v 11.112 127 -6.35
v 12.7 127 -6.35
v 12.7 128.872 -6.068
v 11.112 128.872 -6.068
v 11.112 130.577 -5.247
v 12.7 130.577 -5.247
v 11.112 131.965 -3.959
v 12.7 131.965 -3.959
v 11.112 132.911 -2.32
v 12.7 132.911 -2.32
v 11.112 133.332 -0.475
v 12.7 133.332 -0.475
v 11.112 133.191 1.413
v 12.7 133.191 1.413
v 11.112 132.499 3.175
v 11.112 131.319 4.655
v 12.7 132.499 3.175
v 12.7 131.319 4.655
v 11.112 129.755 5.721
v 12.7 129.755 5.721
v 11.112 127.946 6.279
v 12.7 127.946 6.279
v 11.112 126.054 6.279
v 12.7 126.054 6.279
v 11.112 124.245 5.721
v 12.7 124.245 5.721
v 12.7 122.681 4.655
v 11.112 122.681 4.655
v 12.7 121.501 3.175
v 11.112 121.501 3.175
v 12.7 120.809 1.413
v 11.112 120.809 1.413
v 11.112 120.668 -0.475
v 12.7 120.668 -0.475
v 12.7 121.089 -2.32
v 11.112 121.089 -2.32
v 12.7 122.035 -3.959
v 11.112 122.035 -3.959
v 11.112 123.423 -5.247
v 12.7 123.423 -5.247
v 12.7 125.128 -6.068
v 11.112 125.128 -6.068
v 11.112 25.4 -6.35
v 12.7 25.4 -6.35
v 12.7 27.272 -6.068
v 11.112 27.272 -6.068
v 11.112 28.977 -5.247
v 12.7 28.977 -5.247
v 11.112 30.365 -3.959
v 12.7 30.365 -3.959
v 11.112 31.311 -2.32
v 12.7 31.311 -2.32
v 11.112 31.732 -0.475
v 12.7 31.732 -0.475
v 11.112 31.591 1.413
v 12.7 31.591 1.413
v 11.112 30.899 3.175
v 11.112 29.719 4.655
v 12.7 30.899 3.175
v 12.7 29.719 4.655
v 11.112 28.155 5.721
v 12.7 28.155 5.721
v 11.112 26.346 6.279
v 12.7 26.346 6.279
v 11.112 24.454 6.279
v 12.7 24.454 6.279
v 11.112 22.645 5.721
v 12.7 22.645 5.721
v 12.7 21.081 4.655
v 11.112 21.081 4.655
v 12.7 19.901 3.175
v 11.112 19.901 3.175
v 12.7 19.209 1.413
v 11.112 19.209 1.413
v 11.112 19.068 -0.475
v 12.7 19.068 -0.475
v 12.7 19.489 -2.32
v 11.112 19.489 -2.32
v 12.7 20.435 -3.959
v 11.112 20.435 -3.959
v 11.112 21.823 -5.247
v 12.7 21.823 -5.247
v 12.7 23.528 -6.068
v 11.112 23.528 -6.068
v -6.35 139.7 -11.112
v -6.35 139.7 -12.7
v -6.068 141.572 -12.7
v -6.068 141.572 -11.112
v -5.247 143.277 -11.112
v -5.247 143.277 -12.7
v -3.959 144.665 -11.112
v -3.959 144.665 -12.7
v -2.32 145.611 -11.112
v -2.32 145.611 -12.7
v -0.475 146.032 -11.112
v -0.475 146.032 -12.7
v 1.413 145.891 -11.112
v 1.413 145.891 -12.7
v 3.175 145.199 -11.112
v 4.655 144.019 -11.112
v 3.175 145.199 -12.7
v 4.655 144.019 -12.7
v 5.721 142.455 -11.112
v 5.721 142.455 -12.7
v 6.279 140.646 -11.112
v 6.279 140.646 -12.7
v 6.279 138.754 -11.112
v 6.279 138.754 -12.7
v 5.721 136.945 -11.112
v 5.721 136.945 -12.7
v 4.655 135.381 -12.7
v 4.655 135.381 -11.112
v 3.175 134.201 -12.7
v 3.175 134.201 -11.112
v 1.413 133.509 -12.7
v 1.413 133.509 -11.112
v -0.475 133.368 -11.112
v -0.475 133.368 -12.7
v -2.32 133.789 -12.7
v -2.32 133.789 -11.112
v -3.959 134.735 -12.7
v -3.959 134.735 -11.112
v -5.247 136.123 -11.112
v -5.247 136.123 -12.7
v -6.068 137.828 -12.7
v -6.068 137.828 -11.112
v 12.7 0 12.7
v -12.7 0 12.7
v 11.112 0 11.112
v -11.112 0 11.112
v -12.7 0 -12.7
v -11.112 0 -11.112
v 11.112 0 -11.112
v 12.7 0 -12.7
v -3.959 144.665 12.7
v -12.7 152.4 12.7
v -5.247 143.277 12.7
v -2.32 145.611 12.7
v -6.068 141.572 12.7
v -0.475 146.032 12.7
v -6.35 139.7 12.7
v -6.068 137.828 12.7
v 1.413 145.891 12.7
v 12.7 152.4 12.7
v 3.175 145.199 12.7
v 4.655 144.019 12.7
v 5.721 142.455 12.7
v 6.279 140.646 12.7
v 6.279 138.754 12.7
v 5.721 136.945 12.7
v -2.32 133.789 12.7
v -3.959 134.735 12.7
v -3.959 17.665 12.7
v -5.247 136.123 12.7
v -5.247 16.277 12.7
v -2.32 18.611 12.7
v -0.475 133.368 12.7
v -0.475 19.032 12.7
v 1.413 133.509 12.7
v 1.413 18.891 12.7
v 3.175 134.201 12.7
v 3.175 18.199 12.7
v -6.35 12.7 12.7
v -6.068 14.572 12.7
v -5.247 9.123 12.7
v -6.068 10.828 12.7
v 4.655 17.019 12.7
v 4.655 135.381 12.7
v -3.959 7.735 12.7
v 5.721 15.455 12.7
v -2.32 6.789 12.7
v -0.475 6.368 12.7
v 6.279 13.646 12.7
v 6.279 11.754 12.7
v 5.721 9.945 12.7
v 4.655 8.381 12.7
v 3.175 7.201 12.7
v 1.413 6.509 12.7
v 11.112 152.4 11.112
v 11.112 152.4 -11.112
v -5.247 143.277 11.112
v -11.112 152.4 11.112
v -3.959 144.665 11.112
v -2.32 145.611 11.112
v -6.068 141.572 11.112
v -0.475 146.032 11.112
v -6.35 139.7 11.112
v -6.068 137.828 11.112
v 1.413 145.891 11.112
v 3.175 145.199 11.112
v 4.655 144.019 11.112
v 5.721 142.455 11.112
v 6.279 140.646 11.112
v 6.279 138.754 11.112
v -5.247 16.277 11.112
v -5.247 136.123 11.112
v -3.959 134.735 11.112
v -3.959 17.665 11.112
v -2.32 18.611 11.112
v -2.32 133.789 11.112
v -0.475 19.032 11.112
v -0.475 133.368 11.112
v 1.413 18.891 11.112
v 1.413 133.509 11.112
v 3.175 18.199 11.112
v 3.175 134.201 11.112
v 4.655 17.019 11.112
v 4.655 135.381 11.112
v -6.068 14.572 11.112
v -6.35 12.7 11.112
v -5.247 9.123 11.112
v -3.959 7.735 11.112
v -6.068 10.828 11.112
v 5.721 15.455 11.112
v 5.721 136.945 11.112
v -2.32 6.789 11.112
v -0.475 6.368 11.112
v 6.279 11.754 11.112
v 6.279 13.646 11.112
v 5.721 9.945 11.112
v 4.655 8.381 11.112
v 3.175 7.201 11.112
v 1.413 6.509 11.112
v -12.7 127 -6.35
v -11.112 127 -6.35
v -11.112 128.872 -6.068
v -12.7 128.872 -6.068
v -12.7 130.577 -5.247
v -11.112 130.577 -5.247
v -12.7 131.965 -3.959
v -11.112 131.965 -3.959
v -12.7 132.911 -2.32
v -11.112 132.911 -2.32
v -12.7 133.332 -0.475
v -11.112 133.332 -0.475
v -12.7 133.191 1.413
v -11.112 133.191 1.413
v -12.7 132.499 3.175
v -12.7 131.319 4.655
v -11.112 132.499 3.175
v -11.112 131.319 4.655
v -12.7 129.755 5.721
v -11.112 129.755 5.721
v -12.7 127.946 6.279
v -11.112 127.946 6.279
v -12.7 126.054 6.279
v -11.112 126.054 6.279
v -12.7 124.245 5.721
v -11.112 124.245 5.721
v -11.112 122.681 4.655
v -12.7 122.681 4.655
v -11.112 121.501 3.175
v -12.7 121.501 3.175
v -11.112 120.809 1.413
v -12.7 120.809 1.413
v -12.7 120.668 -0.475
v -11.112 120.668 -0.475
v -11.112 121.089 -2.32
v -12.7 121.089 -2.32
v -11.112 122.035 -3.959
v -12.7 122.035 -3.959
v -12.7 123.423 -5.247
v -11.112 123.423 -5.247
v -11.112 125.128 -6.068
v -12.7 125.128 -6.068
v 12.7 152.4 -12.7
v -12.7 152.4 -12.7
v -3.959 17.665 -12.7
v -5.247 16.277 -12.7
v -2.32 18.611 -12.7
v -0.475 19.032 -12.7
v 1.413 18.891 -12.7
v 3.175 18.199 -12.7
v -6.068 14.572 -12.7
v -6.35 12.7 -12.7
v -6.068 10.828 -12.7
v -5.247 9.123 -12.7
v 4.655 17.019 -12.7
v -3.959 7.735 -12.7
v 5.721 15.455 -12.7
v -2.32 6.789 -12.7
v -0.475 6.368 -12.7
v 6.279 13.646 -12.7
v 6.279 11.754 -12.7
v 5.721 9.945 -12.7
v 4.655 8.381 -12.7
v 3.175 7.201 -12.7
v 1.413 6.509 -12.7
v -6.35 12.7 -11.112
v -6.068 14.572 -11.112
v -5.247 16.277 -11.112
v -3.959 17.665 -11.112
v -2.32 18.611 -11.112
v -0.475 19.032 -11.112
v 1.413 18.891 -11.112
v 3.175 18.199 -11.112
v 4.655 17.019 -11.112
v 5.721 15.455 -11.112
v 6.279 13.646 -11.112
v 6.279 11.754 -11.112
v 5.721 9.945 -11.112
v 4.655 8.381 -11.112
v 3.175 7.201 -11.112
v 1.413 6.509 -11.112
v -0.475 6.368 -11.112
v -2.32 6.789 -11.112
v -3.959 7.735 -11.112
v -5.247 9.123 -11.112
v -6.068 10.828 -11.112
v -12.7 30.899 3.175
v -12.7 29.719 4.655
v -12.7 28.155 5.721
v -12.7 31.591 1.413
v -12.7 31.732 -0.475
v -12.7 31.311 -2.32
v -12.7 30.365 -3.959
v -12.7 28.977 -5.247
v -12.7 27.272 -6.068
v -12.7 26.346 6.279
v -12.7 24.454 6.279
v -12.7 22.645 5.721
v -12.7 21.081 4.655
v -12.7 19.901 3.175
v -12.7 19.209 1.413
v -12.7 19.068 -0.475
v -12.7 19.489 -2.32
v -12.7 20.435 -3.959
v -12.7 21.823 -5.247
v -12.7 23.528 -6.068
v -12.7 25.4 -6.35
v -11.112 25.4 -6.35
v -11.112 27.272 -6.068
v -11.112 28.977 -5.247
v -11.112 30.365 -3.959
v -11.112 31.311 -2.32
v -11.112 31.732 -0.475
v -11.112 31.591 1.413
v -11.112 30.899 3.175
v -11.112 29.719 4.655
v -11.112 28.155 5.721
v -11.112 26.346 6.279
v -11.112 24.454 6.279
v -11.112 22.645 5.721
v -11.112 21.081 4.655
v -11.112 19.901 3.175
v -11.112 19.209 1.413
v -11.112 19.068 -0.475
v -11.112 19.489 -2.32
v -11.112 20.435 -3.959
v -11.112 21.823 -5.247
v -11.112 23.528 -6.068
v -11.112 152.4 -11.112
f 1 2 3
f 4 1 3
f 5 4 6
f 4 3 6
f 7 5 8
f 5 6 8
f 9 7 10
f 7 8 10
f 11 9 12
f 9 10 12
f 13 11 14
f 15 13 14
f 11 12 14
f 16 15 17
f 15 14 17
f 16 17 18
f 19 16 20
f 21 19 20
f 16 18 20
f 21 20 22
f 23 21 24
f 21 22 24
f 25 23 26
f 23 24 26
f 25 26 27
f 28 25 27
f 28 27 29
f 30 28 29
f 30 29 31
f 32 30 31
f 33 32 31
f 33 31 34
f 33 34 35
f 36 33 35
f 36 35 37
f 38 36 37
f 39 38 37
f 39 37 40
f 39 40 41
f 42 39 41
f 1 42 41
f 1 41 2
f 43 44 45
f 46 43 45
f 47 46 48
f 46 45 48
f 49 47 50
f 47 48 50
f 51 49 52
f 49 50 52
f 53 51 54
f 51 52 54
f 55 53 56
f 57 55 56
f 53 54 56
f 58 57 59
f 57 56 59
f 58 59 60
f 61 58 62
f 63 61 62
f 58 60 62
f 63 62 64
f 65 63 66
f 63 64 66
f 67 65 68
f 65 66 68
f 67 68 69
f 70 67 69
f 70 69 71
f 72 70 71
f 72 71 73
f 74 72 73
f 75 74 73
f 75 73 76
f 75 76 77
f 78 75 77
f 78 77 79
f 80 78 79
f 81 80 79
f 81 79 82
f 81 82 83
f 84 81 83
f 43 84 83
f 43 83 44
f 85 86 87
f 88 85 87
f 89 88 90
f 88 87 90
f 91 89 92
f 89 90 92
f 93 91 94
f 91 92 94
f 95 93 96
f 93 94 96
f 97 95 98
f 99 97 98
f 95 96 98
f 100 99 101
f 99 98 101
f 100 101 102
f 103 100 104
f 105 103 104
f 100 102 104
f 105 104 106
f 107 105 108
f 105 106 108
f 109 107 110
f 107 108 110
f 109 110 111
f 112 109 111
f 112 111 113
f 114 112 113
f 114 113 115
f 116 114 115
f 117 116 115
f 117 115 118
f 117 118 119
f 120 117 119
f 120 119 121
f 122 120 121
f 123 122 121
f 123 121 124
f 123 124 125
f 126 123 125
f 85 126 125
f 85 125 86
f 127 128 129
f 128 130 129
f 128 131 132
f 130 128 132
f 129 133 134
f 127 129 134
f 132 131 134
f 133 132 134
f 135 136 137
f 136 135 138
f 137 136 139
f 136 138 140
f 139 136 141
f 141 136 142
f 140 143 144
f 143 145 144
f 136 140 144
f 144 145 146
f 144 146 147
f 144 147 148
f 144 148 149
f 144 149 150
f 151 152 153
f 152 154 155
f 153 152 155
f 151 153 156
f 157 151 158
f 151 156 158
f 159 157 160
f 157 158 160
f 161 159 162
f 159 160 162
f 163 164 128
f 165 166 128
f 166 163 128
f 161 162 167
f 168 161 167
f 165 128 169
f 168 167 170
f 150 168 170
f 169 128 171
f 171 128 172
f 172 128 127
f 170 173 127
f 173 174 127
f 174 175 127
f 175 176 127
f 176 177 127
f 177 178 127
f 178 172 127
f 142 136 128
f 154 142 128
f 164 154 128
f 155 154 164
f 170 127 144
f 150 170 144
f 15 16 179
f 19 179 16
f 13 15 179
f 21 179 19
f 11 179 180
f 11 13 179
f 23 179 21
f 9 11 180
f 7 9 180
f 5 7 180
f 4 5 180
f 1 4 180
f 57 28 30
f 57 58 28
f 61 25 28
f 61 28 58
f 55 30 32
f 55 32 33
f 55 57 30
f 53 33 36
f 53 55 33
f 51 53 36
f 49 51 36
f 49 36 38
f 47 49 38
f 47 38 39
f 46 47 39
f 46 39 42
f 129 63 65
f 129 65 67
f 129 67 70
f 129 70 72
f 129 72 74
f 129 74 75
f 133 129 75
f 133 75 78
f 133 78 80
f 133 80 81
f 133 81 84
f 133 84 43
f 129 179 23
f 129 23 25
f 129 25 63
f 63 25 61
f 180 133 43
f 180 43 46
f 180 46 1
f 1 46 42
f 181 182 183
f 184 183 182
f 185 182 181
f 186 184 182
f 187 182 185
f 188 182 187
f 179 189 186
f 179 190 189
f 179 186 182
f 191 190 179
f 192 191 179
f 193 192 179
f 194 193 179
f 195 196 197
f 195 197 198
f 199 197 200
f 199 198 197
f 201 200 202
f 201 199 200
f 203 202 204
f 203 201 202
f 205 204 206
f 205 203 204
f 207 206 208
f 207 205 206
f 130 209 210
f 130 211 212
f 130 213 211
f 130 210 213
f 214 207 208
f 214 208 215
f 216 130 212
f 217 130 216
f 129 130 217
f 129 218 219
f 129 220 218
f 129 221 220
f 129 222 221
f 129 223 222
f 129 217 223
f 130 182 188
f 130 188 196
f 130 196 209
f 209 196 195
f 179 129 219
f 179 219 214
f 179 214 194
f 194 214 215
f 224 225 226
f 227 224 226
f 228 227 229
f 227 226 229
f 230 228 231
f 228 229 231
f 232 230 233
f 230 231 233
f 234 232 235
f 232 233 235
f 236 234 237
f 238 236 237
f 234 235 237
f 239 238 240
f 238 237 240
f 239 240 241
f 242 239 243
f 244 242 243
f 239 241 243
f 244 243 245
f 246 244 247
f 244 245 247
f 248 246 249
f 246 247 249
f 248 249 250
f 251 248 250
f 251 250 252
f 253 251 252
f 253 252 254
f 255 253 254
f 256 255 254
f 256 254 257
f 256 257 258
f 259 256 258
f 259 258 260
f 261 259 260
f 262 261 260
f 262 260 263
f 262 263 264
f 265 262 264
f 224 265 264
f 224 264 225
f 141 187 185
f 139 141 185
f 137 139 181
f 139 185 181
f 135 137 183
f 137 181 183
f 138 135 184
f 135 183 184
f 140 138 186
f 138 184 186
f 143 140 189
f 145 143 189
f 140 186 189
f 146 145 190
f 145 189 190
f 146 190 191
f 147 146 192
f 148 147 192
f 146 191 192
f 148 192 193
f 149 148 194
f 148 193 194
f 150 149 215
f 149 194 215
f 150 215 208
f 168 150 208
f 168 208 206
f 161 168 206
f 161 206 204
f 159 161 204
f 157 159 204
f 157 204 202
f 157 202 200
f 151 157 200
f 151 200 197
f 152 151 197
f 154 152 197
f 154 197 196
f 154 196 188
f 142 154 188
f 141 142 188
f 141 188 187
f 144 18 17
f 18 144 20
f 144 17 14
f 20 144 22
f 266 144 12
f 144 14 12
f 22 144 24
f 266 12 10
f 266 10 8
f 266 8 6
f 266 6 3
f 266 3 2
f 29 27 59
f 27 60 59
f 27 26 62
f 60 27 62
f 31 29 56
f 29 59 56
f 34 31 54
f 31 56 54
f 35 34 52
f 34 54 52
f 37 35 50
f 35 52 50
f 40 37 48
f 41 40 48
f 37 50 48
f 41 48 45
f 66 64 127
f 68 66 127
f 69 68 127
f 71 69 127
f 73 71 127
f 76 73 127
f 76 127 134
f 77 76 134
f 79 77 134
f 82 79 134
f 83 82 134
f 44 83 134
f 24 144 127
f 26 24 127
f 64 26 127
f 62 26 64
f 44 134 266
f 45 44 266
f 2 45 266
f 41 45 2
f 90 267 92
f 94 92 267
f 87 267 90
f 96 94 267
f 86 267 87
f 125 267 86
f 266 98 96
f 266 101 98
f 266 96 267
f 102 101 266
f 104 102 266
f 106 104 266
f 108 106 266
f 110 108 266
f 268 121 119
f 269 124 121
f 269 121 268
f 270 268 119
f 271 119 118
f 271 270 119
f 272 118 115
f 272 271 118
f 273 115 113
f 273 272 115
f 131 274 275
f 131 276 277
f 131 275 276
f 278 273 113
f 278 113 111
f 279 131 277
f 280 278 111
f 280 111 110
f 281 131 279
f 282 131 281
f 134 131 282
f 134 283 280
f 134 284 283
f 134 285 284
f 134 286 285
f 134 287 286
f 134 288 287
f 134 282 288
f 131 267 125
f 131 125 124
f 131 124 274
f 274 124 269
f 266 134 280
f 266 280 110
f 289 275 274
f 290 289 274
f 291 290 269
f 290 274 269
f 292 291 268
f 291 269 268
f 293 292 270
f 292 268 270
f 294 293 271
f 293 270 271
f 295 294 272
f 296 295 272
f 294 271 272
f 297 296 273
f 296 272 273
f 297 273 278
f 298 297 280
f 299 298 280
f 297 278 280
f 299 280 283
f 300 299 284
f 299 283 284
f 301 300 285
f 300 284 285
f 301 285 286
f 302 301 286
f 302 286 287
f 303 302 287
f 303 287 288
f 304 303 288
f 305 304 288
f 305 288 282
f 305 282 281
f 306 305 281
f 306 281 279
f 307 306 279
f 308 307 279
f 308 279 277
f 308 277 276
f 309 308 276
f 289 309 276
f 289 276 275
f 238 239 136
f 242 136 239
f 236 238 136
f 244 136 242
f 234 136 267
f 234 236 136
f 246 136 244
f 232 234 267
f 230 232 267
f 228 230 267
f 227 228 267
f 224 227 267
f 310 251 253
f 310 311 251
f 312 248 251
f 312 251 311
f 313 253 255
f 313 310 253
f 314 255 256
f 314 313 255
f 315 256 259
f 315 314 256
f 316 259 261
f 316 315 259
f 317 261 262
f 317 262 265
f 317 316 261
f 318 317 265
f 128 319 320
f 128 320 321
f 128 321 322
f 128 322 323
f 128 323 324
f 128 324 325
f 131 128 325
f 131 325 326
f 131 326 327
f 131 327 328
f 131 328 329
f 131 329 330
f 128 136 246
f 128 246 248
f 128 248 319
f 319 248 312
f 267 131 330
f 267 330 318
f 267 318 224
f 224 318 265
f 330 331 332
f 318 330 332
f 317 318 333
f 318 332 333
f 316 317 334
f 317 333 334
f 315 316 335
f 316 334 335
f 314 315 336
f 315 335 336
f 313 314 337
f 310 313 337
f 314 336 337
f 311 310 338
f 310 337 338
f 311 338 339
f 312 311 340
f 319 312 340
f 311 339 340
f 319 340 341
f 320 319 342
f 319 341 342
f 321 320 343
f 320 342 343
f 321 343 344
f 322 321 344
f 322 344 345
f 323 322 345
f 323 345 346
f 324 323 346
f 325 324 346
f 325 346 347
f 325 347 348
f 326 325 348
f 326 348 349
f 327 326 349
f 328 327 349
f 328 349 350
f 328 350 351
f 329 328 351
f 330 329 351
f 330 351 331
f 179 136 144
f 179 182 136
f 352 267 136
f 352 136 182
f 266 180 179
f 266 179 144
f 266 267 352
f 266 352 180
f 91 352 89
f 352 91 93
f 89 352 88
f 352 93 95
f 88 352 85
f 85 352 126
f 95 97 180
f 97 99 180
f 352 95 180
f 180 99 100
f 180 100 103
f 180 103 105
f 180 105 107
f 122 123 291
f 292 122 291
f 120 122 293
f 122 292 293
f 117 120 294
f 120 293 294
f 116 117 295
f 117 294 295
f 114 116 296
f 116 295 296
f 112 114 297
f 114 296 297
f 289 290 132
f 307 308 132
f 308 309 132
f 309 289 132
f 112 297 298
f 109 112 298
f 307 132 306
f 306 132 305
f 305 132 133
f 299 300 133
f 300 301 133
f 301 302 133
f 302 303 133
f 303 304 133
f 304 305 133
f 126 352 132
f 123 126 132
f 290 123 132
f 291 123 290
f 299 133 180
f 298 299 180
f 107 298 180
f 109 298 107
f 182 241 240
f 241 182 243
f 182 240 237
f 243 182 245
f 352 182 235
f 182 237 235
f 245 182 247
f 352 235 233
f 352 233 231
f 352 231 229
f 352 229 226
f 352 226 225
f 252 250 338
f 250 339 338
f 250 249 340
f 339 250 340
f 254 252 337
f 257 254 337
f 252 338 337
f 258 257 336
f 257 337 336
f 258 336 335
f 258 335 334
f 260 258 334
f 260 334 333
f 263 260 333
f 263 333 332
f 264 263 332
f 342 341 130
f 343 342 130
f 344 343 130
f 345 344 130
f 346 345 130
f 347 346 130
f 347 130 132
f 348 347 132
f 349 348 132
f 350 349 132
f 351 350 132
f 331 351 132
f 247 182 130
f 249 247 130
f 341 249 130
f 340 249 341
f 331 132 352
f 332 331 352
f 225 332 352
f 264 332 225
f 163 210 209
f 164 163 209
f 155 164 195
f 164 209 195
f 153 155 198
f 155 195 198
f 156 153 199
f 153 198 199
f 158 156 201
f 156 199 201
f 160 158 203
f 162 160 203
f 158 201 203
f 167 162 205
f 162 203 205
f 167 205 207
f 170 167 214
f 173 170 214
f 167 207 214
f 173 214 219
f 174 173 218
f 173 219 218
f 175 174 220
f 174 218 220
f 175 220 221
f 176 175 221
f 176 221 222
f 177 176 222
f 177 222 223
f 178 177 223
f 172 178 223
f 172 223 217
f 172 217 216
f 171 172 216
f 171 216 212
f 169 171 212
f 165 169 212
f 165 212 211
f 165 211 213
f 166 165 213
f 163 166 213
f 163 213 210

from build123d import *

# Parameters (mm, degrees)
SKETCH1_W           = 25.4
SKETCH1_H           = 25.4
SKETCH1_W_2         = 22.225
SKETCH1_H_2         = 22.225
BOSS_EXTRUDE1_DEPTH = 152.4
SKETCH2_R           = 6.35
CUT_EXTRUDE1_DEPTH  = 127
SKETCH3_R           = 6.35
CUT_EXTRUDE2_DEPTH  = 127
SKETCH4_R           = 6.35
CUT_EXTRUDE3_DEPTH  = 127
SKETCH5_R           = 6.35
CUT_EXTRUDE4_DEPTH  = 127


with BuildPart() as part:
    # Sketch1 → Boss-Extrude1 (new body)
    with BuildSketch(Plane(origin=(0, 0, 0), x_dir=(1, 0, 0), z_dir=(0, 1, 0))):
        Rectangle(SKETCH1_W, SKETCH1_H)
        Rectangle(SKETCH1_W_2, SKETCH1_H_2, mode=Mode.SUBTRACT)
    extrude(amount=BOSS_EXTRUDE1_DEPTH)

    # Sketch2 → Cut-Extrude1 (cut)
    with BuildSketch(Plane(origin=(0, 0, -12.7), x_dir=(-1, 0, 0), z_dir=(0, 0, -1))):
        with Locations((0, 139.7)):
            Circle(SKETCH2_R)
    extrude(amount=-CUT_EXTRUDE1_DEPTH, mode=Mode.SUBTRACT)

    # Sketch3 → Cut-Extrude2 (cut)
    with BuildSketch(Plane(origin=(12.7, 0, 0), x_dir=(0, 0, -1), z_dir=(1, 0, 0))):
        with Locations((0, 127)):
            Circle(SKETCH3_R)
    extrude(amount=-CUT_EXTRUDE2_DEPTH, mode=Mode.SUBTRACT)

    # Sketch4 → Cut-Extrude3 (cut)
    with BuildSketch(Plane(origin=(0, 0, -12.7), x_dir=(-1, 0, 0), z_dir=(0, 0, -1))):
        with Locations((0, 12.7)):
            Circle(SKETCH4_R)
    extrude(amount=-CUT_EXTRUDE3_DEPTH, mode=Mode.SUBTRACT)

    # Sketch5 → Cut-Extrude4 (cut)
    with BuildSketch(Plane(origin=(12.7, 0, 0), x_dir=(0, 0, -1), z_dir=(1, 0, 0))):
        with Locations((0, 25.4)):
            Circle(SKETCH5_R)
    extrude(amount=-CUT_EXTRUDE4_DEPTH, mode=Mode.SUBTRACT)


solid = part.part
